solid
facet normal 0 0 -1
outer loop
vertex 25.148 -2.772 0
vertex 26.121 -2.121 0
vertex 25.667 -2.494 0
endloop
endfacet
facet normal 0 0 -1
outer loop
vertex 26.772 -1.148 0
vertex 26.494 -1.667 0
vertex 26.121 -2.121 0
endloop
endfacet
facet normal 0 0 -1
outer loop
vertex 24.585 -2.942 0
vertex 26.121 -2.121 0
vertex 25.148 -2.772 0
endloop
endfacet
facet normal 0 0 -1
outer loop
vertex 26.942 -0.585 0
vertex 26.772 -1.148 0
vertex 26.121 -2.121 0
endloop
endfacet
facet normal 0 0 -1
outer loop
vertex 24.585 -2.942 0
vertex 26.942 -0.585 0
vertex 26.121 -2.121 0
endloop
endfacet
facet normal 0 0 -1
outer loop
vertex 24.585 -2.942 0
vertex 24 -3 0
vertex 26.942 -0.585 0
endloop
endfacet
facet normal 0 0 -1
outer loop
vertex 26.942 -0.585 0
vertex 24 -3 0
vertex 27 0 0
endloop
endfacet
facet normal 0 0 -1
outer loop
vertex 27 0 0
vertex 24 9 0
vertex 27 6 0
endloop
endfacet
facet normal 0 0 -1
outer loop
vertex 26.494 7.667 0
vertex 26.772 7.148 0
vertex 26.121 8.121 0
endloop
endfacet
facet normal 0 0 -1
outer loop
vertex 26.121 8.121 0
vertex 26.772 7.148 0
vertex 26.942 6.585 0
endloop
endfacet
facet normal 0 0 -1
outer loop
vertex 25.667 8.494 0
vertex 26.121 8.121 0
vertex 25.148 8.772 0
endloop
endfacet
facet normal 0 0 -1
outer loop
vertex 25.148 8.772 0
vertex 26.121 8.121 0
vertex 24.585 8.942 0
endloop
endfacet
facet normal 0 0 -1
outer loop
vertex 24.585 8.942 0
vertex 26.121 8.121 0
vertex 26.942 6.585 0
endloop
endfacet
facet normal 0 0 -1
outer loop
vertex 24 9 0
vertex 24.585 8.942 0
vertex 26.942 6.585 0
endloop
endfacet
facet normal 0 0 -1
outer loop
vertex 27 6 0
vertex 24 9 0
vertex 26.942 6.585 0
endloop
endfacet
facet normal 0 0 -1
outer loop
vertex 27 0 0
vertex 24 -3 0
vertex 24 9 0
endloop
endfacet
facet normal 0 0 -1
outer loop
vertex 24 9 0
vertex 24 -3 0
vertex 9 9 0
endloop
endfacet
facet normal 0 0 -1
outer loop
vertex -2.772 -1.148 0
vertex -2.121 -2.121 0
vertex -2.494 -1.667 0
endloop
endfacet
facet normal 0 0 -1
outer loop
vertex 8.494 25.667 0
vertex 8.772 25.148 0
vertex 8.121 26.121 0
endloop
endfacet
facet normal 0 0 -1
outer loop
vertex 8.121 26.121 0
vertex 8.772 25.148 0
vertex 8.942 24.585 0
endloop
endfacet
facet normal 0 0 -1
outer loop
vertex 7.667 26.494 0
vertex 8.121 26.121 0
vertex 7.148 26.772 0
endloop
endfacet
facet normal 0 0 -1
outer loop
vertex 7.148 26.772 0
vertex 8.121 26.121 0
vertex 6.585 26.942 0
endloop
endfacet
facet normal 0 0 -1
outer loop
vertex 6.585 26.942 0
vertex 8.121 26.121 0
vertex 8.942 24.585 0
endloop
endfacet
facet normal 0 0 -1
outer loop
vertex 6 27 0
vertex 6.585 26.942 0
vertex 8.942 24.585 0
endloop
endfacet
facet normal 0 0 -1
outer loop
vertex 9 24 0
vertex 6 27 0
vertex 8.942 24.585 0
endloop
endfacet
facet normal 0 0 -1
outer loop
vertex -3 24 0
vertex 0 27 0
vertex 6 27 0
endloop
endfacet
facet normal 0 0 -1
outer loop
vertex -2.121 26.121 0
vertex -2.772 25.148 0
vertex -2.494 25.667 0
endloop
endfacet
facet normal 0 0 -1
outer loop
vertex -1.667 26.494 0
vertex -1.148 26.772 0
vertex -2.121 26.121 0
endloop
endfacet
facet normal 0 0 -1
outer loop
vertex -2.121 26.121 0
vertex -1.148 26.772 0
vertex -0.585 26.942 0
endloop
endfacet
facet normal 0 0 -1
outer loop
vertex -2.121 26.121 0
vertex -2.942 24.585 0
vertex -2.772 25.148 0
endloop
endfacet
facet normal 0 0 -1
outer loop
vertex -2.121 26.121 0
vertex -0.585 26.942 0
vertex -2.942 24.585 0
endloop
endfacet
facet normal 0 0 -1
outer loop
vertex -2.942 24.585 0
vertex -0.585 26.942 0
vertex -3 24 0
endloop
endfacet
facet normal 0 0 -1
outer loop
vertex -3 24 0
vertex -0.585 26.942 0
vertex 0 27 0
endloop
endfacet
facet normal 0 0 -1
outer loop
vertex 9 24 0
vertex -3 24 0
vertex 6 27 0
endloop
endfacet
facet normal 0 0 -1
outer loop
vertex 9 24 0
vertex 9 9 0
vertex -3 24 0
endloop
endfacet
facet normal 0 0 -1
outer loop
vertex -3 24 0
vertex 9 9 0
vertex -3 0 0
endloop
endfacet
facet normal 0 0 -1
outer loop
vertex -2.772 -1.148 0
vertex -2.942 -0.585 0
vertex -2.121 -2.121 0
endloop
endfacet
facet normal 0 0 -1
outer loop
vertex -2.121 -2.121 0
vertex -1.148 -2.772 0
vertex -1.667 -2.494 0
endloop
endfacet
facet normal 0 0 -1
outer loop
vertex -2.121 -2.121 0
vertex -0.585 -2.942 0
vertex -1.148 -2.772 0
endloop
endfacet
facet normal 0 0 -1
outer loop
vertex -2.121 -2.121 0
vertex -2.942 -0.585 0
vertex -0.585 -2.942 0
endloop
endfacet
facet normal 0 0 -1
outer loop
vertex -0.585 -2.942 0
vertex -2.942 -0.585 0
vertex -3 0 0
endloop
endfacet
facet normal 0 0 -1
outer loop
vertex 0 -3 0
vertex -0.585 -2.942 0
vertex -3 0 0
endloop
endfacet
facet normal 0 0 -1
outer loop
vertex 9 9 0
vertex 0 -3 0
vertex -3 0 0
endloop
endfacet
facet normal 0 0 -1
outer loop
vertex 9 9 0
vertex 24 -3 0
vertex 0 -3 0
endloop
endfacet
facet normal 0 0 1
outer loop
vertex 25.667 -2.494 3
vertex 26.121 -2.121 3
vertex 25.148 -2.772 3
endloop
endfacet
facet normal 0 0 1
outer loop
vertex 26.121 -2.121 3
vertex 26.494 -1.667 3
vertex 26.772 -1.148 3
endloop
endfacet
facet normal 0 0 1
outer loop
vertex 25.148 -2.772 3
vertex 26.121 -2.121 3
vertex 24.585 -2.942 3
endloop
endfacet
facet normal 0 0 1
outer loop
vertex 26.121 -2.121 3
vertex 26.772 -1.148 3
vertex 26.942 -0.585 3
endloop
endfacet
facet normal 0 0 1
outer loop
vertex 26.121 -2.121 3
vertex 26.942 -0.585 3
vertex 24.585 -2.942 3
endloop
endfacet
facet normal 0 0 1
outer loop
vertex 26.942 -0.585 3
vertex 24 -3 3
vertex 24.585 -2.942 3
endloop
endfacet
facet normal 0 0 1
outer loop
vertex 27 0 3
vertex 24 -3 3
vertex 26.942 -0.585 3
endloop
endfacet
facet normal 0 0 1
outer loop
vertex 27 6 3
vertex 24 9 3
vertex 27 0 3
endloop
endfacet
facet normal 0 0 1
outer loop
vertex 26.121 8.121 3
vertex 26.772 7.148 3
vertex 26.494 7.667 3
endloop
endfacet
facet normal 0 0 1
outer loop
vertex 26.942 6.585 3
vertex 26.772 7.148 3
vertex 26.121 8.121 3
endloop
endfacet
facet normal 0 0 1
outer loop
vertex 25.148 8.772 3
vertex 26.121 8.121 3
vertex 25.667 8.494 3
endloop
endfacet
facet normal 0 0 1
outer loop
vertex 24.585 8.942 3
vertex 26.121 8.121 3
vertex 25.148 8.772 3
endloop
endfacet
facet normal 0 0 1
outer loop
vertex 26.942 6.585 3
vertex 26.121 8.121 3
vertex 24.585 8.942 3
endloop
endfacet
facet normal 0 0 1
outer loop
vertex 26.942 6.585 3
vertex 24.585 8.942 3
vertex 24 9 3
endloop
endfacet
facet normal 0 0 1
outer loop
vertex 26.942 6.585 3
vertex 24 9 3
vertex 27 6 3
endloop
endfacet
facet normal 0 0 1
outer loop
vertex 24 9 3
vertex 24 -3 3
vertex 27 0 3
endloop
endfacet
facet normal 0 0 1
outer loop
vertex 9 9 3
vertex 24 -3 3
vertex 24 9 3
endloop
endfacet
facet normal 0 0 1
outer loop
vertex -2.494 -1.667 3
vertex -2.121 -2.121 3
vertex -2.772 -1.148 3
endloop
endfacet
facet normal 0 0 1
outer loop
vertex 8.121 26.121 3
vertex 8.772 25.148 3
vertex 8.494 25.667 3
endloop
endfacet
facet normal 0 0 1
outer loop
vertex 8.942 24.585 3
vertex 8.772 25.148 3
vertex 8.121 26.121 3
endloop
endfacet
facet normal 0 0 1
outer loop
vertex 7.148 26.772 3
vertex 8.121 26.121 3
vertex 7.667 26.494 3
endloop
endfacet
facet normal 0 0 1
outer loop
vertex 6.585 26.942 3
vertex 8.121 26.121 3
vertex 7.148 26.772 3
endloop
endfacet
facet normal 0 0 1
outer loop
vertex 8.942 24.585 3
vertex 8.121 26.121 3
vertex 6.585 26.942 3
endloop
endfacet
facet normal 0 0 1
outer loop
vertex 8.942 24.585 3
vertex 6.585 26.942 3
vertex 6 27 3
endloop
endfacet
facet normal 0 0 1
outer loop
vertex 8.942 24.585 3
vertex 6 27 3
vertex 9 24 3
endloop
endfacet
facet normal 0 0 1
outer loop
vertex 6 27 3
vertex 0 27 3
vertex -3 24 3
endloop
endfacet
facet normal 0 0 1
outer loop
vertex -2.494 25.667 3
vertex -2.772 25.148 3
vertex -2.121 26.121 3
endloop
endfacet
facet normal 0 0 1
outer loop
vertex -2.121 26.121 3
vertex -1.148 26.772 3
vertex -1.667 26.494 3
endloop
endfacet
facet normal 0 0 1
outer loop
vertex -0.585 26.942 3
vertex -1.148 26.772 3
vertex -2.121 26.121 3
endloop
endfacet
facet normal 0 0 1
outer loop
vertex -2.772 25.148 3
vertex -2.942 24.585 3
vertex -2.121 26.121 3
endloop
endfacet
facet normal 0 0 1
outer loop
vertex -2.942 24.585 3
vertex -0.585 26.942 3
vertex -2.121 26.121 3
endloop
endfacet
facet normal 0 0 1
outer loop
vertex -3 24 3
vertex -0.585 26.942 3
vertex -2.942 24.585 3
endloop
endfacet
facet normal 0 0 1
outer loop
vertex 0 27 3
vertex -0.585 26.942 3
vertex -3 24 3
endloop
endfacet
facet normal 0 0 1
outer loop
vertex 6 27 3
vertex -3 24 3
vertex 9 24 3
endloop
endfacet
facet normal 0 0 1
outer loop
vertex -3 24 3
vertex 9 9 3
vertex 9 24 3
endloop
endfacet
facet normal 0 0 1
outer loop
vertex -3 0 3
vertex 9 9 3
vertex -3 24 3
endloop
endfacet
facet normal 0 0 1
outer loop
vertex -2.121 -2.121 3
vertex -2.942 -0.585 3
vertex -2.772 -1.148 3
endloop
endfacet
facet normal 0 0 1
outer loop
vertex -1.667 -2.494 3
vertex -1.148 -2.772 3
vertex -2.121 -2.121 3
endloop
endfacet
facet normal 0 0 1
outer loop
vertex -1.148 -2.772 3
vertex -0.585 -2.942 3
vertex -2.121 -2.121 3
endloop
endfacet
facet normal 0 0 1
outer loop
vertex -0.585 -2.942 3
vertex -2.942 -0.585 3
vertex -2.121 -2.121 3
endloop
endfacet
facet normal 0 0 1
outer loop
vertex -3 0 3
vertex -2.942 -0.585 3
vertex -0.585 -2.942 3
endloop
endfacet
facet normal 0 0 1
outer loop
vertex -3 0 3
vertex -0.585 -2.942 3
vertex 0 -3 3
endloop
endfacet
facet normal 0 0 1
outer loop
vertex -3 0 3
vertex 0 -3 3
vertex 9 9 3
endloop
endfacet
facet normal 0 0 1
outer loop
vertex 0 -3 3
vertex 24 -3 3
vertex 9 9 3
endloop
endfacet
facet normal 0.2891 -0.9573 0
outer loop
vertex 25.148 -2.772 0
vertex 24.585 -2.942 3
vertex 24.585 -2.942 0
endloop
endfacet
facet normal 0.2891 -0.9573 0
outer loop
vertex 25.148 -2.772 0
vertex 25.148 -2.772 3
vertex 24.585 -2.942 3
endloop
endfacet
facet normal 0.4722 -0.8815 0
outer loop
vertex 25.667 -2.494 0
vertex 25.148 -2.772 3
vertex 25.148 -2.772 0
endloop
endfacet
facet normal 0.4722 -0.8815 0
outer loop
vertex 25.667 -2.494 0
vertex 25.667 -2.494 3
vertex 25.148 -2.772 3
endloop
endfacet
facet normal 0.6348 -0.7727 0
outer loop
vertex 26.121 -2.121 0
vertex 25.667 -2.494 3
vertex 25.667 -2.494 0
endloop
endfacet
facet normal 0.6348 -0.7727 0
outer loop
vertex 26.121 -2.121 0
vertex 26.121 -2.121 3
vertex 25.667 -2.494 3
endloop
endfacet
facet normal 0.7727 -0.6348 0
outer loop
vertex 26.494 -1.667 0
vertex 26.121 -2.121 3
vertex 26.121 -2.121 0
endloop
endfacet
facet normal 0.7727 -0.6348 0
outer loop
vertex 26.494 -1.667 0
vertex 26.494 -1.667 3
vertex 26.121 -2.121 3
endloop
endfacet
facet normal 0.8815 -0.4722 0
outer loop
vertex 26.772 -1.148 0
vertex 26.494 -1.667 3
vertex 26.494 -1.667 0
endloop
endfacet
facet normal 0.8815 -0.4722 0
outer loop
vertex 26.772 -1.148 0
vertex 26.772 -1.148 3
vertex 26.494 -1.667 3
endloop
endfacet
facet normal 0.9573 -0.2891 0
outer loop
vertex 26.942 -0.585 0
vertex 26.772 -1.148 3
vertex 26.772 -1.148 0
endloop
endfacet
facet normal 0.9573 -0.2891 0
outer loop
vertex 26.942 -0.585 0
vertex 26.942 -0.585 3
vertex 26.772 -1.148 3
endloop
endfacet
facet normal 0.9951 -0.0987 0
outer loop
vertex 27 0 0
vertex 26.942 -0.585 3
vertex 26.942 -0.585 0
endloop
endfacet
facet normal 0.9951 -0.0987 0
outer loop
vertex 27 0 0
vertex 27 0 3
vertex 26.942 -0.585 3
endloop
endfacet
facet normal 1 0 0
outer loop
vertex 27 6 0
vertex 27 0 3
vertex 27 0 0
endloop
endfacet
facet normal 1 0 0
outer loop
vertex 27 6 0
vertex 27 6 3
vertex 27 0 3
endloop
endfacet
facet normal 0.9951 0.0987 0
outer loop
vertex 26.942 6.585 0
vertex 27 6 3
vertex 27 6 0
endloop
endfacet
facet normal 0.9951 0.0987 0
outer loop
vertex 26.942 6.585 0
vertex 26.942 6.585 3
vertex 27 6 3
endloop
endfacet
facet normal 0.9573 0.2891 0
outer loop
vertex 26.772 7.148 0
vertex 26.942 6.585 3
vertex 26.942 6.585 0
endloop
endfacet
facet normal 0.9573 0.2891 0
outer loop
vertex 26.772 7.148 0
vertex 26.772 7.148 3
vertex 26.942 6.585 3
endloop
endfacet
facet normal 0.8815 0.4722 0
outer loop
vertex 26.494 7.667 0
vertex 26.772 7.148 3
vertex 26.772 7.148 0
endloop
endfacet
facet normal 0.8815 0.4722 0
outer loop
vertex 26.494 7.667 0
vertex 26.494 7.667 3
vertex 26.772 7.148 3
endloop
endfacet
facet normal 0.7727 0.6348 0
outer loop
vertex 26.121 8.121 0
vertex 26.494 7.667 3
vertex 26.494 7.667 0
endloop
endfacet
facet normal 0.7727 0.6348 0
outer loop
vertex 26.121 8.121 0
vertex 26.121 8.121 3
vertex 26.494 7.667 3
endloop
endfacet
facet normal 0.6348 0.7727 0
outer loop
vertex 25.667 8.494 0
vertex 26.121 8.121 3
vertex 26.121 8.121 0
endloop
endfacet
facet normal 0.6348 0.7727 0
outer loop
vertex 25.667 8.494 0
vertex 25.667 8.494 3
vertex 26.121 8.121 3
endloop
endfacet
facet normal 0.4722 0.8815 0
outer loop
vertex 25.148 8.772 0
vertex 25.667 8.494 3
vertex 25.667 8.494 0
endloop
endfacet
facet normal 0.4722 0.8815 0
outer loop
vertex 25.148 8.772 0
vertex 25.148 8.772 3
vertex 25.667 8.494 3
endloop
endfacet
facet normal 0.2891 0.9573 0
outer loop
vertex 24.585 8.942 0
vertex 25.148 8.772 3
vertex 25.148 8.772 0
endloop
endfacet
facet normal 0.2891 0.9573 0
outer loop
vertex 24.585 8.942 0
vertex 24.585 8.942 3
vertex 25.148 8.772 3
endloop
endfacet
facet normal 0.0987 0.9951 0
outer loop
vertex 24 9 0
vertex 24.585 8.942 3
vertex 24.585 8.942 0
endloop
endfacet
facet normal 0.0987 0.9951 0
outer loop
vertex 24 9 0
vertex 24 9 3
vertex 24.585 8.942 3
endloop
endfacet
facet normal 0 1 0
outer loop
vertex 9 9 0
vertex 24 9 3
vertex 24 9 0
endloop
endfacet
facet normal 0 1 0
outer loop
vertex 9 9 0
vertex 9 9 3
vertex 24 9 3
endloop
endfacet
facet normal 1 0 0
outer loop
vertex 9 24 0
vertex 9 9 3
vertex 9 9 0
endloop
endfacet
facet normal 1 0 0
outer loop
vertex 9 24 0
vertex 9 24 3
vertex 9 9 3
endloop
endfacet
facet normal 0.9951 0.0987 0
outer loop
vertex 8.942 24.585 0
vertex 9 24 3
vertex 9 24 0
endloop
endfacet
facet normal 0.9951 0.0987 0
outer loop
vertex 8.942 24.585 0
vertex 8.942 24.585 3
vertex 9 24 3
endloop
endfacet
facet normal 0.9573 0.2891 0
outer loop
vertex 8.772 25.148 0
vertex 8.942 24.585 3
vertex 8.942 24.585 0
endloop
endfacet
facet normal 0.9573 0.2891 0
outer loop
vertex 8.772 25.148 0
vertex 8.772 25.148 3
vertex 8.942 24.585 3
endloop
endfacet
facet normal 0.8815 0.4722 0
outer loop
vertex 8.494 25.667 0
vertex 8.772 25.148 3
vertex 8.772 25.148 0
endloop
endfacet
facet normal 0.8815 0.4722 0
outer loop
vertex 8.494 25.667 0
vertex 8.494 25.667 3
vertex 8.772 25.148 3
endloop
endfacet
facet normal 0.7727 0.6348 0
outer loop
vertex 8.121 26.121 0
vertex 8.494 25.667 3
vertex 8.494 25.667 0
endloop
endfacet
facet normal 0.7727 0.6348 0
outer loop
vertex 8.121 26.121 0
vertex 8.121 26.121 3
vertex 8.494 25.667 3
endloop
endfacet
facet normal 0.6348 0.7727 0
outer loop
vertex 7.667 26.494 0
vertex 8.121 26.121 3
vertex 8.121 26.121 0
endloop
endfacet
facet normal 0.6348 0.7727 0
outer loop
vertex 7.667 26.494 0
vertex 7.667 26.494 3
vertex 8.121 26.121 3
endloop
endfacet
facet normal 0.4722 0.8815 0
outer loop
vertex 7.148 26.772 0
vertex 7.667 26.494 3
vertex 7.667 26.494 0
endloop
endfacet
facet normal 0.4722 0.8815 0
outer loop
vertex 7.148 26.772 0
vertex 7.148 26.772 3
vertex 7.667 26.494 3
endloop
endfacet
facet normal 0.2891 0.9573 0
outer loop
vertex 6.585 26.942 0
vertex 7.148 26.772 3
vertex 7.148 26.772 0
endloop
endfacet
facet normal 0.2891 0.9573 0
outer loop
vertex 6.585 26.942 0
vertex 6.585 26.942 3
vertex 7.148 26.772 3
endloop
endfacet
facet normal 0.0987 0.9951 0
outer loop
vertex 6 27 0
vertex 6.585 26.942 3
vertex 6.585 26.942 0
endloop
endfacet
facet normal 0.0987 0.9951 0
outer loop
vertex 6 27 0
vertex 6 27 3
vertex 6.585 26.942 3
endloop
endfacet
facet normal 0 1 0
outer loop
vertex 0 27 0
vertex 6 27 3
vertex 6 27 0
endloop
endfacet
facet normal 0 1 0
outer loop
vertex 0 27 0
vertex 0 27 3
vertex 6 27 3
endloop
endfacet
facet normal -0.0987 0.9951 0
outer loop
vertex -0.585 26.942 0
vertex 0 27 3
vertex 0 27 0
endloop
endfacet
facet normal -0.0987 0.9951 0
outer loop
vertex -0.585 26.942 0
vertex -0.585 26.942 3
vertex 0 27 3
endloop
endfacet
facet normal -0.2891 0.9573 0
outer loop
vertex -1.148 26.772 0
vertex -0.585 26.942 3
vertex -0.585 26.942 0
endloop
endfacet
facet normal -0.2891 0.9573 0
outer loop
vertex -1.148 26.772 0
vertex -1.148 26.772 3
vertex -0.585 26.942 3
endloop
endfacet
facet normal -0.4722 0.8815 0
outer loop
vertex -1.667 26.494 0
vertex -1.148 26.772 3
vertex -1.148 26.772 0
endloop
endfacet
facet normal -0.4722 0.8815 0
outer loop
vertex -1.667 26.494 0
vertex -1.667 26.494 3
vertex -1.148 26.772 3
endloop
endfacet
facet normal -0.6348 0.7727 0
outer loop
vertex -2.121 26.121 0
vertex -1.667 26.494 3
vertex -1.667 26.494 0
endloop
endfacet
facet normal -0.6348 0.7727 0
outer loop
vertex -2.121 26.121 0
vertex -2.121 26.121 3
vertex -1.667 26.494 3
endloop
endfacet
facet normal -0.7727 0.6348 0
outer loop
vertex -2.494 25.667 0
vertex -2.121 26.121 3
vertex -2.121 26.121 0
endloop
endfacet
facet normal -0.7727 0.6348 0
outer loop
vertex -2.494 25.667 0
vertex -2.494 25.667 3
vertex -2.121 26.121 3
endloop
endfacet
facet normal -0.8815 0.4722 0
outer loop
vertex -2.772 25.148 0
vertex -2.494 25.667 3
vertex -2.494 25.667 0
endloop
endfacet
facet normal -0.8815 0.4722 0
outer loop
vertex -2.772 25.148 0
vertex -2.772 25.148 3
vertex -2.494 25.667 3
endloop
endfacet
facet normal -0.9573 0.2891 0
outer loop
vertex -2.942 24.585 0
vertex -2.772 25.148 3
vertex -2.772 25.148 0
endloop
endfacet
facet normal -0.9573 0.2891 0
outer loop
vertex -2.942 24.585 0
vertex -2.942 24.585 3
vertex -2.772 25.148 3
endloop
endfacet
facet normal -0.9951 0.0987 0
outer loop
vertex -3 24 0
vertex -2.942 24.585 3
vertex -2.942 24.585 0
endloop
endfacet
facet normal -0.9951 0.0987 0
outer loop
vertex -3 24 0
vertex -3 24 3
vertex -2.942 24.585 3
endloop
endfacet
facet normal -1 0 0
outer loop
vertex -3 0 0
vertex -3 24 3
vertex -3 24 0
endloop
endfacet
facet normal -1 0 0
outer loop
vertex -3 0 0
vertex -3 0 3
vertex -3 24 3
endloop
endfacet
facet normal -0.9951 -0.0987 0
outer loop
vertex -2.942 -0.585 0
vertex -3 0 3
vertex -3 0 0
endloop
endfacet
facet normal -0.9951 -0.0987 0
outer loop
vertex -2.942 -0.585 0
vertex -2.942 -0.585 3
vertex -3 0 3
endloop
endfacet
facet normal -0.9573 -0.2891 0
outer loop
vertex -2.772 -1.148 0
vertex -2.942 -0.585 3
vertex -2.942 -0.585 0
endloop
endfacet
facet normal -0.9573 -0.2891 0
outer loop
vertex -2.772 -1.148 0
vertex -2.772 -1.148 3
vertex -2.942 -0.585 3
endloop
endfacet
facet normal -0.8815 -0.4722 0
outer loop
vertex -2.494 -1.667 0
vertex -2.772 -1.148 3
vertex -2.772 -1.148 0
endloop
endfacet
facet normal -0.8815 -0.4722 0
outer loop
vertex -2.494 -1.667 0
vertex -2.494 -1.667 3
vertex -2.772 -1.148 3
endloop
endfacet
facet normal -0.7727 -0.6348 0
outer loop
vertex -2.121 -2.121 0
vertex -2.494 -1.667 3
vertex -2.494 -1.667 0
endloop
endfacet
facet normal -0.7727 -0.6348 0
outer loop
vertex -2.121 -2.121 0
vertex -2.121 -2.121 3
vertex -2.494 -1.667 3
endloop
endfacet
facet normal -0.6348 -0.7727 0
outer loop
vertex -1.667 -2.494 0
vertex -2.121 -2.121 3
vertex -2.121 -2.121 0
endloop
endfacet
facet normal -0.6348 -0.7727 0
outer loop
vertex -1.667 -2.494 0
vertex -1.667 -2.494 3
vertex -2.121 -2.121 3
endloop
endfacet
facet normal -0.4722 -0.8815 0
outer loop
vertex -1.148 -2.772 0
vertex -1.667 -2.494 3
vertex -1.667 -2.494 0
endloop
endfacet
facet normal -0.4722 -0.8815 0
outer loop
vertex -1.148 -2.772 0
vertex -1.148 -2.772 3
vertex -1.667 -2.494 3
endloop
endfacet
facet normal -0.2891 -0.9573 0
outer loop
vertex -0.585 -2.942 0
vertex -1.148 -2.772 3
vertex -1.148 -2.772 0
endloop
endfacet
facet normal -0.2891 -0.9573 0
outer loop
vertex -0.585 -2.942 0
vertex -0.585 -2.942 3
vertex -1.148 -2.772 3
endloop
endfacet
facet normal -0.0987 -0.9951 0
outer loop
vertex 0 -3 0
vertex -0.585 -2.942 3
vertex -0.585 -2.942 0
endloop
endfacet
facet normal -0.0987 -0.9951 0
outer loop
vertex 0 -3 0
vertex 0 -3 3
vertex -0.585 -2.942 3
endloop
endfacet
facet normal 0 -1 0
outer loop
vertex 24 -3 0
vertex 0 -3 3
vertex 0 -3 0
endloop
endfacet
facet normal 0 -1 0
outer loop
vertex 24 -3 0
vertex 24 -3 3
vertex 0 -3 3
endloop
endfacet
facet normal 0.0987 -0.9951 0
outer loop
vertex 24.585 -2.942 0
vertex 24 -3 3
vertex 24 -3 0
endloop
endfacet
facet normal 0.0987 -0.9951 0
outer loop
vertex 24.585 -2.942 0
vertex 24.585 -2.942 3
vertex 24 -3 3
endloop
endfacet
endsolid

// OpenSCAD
linear_extrude(3) offset(r=3, $fn=32) polygon([[0,0],[24,0],[24,6],[6,6],[6,24],[0,24]]);
